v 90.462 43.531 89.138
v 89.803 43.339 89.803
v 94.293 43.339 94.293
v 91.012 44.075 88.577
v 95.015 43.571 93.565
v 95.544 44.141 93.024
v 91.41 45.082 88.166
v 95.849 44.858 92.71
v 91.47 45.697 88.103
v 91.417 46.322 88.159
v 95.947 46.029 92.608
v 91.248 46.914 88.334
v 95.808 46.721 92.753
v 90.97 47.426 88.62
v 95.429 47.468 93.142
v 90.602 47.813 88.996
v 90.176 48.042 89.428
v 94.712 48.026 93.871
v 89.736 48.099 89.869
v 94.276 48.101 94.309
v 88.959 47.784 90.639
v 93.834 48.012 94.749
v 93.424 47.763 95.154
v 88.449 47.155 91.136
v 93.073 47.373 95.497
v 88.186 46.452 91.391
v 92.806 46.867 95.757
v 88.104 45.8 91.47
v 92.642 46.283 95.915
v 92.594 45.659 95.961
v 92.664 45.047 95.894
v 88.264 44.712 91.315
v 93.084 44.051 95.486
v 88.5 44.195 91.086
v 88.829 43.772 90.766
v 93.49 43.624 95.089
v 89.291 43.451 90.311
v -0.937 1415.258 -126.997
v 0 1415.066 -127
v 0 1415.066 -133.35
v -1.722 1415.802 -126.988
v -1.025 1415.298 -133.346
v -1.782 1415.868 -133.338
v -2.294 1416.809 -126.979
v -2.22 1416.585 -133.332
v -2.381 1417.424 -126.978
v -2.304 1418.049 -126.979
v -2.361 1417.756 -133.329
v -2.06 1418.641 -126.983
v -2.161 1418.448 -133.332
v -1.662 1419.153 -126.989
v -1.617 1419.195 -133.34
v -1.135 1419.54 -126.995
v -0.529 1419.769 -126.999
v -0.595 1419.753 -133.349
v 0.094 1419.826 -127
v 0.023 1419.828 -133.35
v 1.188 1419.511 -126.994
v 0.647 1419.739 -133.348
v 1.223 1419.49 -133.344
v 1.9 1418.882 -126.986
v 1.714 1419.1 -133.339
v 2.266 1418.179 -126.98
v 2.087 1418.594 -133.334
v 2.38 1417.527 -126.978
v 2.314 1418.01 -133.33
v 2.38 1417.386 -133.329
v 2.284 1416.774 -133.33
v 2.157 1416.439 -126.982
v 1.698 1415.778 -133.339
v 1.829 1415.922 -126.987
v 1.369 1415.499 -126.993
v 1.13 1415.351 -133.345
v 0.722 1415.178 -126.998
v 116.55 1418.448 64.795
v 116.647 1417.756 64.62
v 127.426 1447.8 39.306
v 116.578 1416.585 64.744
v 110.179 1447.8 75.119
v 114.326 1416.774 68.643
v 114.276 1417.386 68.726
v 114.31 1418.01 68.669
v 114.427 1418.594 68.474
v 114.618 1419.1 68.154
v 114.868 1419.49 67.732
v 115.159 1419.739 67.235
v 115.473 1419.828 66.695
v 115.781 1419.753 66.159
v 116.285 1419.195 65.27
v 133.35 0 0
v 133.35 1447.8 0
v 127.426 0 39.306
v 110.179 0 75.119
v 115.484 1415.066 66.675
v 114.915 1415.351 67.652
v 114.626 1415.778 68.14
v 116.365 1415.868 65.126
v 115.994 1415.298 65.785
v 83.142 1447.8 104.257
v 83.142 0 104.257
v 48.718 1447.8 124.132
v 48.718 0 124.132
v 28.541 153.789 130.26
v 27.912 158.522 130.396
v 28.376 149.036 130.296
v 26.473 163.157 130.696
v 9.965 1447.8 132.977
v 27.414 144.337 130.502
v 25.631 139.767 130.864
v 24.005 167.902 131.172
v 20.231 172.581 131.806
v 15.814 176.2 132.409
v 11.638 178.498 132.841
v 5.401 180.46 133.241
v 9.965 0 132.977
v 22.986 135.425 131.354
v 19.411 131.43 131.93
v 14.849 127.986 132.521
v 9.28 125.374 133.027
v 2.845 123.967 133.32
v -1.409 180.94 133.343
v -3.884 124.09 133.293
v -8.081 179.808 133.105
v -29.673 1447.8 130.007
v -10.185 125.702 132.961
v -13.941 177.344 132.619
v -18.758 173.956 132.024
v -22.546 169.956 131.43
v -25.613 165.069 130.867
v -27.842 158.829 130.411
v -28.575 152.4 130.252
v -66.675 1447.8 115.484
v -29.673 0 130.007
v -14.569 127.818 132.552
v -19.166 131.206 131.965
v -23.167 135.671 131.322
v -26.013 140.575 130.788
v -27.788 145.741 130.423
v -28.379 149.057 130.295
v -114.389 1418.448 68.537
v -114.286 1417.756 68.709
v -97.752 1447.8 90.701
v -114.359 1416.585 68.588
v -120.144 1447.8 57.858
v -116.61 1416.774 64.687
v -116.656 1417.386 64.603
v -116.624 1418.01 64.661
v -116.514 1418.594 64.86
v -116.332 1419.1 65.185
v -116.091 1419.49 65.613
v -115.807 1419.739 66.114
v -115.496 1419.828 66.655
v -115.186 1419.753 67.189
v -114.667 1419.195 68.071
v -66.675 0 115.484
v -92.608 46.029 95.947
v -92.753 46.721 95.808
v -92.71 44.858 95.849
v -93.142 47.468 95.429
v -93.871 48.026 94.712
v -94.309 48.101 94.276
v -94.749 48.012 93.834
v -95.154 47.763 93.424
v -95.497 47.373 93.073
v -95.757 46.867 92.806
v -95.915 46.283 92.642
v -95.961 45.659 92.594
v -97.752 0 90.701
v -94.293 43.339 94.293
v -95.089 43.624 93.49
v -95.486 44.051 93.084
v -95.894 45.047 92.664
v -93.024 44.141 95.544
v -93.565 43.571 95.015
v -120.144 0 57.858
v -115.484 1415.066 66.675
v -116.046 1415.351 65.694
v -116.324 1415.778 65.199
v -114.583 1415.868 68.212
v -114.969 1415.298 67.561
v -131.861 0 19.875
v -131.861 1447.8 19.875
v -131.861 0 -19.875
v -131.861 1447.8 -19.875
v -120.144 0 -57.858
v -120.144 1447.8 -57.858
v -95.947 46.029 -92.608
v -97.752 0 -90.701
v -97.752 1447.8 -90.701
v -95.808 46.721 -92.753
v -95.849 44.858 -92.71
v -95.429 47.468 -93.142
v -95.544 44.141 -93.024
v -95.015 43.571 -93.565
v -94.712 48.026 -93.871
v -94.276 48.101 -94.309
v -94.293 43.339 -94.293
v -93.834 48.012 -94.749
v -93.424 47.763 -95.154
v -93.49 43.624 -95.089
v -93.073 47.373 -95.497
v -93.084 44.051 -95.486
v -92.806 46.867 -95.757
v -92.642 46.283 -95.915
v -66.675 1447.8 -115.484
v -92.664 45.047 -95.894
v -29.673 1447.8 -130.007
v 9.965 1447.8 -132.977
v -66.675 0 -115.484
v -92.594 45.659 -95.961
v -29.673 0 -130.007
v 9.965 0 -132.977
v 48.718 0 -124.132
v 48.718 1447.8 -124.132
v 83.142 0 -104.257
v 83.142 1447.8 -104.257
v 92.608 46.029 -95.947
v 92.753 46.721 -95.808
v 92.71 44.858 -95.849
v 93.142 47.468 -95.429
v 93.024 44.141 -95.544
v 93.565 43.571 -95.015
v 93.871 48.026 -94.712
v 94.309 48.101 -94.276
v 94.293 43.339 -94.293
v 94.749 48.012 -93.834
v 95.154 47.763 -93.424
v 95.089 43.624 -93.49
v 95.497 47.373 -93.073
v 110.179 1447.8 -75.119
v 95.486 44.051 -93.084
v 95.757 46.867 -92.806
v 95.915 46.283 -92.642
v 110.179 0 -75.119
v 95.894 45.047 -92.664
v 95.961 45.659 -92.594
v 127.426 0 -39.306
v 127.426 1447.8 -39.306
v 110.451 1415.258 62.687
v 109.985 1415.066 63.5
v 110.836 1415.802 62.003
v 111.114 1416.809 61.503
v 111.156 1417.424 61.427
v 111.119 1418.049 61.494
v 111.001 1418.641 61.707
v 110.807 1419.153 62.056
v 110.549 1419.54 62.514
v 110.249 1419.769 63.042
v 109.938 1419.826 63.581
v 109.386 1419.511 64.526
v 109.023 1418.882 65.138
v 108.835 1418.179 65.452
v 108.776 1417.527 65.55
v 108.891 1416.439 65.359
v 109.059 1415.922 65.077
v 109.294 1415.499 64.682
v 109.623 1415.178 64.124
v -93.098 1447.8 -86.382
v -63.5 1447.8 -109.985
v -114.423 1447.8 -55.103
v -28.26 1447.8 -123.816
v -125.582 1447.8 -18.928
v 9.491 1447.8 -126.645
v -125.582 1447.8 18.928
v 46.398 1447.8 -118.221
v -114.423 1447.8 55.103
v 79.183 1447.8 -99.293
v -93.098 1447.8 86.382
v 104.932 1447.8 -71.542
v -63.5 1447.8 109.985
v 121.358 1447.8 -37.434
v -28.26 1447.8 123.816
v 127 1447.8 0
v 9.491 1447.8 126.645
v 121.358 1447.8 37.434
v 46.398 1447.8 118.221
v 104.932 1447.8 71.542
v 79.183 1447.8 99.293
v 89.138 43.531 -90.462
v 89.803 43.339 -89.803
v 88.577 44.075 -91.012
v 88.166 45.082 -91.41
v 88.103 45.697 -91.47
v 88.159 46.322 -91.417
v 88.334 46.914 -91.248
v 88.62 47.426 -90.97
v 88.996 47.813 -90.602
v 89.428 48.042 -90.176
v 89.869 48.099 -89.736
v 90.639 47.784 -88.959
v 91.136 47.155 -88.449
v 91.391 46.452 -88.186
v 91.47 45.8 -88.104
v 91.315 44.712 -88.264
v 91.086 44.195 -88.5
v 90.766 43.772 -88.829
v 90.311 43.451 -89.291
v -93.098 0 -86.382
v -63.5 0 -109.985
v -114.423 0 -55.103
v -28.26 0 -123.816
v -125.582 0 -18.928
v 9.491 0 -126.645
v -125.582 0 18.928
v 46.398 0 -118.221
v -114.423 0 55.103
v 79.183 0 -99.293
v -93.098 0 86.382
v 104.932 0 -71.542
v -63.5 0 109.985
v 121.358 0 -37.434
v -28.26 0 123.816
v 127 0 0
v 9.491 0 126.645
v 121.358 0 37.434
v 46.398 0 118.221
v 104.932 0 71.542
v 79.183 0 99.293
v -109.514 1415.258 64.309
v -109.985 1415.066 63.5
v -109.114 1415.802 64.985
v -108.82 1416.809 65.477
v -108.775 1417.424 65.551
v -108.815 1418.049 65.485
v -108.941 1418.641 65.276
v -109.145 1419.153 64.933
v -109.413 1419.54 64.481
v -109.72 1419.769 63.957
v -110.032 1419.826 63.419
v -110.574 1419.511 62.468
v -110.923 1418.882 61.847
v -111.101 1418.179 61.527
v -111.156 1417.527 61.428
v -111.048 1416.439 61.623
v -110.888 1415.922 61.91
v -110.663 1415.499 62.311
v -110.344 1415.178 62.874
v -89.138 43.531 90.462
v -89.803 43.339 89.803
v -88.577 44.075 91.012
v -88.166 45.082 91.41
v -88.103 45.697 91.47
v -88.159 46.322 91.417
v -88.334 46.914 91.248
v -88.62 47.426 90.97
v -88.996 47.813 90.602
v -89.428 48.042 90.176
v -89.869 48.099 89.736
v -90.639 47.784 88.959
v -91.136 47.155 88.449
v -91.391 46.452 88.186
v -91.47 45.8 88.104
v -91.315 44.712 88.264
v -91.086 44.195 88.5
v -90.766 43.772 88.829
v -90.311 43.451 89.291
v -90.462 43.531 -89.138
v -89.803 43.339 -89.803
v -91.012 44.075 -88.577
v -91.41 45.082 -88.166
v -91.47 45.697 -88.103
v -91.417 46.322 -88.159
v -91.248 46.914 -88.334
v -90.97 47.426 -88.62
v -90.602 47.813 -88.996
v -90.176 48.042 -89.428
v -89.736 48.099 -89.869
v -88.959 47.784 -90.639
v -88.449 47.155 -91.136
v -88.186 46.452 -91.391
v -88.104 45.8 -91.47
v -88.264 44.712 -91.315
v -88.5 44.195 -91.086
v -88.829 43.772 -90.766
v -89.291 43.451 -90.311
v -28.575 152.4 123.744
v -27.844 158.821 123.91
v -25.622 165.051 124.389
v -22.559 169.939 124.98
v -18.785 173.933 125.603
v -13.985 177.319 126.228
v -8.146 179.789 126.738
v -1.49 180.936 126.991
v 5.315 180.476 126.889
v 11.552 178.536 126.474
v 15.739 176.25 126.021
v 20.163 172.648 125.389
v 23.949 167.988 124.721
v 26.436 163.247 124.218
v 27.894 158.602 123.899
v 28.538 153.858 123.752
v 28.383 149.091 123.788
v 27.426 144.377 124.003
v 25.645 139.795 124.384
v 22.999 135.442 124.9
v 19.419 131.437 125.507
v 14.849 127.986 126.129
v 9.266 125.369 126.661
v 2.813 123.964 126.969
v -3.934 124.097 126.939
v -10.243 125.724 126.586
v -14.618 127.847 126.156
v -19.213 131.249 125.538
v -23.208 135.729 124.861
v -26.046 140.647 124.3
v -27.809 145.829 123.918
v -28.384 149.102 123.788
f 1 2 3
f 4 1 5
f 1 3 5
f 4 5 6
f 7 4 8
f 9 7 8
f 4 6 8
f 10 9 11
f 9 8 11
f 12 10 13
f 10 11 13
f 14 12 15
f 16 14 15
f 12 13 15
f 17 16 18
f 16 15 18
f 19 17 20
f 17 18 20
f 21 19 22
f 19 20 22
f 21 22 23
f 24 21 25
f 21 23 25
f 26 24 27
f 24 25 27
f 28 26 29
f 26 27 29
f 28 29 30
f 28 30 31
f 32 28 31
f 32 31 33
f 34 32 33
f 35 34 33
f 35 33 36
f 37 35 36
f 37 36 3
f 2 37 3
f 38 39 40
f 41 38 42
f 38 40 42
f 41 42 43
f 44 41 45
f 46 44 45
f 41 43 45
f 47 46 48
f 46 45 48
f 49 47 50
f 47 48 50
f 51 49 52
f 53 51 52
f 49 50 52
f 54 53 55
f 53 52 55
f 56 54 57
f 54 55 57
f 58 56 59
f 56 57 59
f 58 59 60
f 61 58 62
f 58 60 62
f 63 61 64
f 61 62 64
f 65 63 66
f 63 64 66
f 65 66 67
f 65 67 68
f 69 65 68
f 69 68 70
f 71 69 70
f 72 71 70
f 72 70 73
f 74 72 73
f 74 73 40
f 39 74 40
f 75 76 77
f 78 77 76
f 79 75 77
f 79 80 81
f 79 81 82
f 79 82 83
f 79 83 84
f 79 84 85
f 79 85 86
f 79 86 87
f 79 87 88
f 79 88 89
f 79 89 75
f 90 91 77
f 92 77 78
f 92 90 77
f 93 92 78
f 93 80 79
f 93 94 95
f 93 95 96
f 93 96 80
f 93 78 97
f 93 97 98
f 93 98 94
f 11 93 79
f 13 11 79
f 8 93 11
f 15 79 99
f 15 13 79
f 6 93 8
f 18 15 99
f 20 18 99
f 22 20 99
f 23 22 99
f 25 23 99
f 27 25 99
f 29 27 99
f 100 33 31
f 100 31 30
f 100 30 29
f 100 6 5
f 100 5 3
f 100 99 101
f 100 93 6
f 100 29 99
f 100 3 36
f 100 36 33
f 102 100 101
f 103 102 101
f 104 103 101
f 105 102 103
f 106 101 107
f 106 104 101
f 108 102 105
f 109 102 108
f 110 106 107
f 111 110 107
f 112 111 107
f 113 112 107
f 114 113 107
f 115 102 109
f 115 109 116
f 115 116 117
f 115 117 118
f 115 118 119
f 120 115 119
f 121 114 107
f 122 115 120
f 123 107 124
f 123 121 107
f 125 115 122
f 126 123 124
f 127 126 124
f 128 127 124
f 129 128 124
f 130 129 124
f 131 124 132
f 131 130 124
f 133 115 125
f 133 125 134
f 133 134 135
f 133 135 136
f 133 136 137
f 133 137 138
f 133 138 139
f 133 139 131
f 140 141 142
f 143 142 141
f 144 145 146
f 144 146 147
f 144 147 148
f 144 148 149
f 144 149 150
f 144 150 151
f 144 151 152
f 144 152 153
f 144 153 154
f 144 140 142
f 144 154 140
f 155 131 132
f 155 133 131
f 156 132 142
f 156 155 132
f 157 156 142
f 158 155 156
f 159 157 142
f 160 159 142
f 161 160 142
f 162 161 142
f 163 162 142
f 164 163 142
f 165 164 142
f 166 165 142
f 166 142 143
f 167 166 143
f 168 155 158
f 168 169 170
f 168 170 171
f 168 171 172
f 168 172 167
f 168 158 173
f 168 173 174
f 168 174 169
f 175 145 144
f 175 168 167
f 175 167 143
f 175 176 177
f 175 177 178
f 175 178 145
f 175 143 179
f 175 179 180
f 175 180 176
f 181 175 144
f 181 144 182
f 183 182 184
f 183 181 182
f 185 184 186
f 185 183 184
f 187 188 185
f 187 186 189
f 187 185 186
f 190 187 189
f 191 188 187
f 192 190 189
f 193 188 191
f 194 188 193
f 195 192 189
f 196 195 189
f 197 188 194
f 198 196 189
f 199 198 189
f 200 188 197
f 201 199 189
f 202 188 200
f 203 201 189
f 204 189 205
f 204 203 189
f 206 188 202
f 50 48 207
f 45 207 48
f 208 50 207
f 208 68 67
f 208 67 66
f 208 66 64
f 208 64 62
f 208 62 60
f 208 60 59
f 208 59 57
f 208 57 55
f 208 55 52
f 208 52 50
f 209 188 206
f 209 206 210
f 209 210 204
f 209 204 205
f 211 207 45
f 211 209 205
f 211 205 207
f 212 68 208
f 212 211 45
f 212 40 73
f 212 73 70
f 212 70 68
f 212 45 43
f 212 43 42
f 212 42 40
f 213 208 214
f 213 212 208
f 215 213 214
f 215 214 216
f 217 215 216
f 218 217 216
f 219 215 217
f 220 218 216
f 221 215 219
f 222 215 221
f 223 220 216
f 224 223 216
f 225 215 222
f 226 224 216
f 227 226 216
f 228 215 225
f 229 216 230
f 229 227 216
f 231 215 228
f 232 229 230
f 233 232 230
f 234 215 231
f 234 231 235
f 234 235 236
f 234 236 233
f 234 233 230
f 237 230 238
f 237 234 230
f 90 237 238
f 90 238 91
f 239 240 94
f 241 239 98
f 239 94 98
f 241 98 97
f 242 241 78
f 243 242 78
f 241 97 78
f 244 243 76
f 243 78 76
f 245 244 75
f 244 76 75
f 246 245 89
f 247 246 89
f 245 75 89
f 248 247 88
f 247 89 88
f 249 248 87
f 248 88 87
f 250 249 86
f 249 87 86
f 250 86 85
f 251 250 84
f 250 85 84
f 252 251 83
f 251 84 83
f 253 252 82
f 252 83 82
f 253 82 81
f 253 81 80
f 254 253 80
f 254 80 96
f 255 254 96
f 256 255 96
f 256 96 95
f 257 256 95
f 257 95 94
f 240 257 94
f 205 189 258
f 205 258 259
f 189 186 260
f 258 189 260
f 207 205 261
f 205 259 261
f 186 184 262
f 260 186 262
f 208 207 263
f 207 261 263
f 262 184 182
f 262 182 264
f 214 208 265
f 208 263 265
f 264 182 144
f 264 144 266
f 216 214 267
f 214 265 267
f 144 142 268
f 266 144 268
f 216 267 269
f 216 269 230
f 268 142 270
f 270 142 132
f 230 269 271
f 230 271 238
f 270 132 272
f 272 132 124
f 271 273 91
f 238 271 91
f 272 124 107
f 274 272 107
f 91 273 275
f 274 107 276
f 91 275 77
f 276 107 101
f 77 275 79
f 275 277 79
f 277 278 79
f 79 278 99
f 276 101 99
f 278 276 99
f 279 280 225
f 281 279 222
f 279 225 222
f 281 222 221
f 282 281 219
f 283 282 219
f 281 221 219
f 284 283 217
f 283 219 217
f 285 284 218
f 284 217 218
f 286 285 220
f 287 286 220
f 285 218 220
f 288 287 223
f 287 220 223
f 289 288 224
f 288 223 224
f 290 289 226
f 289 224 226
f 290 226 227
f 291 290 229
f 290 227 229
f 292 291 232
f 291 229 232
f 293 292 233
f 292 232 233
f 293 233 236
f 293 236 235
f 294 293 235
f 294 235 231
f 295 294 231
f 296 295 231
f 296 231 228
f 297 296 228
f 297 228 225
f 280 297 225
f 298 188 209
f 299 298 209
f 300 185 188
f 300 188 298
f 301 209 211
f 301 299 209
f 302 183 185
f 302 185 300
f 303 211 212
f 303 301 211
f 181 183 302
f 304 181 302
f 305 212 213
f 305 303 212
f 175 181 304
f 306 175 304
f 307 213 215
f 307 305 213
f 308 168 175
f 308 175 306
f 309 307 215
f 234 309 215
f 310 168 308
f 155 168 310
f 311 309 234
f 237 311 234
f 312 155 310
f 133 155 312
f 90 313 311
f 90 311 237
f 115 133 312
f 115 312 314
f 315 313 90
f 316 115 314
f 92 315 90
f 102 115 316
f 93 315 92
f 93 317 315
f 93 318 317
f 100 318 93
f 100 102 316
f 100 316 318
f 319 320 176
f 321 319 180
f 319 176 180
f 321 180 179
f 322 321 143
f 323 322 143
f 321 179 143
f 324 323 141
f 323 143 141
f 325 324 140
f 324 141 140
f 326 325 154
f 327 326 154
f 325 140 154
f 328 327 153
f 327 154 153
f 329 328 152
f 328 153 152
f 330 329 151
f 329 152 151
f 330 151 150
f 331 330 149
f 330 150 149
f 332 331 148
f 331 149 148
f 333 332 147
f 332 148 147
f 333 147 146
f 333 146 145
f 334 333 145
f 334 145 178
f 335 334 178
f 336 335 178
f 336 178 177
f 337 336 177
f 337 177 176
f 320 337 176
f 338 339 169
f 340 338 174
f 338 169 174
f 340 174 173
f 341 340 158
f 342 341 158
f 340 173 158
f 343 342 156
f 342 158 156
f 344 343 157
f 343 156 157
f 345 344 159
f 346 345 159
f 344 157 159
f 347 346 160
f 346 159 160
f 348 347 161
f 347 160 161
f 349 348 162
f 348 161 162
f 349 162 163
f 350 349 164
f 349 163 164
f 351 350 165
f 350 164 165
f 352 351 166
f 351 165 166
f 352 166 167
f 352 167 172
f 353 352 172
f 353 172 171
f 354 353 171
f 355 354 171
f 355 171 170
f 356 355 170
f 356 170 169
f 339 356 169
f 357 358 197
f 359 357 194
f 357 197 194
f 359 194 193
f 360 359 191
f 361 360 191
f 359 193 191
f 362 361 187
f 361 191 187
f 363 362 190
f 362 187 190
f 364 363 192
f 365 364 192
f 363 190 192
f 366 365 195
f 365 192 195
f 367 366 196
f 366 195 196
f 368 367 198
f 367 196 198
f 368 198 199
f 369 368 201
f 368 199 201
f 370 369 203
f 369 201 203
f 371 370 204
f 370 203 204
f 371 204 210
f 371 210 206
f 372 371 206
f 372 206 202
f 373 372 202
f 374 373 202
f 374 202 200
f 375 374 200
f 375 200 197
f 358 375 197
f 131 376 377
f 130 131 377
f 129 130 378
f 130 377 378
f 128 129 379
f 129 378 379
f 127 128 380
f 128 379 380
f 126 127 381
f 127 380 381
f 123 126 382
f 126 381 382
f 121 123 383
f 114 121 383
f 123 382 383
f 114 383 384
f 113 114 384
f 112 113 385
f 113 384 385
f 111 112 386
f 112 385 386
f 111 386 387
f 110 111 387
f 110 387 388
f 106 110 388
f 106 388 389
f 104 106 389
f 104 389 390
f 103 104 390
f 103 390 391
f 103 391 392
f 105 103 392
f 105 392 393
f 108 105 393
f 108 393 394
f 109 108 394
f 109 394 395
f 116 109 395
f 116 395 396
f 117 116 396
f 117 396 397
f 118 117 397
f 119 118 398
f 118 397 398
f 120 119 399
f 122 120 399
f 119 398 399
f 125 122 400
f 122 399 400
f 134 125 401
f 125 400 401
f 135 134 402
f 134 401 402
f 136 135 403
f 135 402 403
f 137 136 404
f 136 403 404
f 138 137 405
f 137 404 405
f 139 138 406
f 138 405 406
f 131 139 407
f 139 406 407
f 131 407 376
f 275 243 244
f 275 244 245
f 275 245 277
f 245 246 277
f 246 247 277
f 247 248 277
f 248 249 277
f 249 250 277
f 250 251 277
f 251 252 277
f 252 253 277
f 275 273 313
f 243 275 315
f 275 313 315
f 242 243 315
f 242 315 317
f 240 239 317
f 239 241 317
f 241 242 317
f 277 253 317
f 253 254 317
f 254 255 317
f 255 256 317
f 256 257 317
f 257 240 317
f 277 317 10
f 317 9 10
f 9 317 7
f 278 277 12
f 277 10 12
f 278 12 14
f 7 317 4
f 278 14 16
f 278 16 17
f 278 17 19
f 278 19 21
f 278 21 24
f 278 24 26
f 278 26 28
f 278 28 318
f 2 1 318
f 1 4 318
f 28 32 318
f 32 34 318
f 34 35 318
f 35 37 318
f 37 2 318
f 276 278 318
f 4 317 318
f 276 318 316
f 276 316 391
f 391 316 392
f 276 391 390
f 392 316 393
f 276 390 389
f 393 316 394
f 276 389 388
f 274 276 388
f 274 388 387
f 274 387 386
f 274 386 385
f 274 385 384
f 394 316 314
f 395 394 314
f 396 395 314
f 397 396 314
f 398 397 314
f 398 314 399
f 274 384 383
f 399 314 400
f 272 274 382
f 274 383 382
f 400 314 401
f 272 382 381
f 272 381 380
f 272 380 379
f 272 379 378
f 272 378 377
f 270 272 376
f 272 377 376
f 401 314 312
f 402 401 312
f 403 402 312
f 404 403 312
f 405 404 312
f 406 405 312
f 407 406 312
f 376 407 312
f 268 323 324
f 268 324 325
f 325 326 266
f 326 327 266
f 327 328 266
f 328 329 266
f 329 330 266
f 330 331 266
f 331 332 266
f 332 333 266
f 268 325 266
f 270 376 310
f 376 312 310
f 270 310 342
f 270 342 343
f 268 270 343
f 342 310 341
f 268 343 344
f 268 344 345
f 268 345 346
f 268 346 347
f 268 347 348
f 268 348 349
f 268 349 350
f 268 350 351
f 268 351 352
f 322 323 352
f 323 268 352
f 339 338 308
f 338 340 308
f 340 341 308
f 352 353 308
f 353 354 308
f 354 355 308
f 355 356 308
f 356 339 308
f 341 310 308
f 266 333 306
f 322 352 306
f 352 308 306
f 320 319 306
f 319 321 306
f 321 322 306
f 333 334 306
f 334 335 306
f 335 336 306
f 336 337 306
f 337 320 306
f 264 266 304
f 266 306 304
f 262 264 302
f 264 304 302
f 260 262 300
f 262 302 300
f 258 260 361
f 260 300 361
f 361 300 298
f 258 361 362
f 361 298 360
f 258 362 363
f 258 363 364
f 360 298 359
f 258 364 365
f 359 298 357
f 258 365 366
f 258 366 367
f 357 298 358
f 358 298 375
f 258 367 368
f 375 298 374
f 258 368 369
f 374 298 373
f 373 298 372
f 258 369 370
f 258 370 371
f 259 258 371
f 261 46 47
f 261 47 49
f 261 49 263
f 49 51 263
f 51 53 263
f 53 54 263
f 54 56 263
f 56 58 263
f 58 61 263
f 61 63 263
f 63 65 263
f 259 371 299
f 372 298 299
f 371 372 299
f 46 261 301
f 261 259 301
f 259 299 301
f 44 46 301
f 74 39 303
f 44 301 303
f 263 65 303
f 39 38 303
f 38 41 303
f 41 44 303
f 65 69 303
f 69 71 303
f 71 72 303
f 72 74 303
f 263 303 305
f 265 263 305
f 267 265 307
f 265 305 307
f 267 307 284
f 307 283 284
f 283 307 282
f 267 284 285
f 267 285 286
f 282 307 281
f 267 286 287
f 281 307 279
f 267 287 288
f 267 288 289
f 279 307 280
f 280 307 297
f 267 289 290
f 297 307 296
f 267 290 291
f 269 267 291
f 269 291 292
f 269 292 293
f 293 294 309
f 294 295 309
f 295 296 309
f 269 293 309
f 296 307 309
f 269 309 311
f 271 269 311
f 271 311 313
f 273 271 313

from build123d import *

# Parameters (mm, degrees)
F0_R             = 133.35
F0_R_2           = 127
F2_DEPTH         = 1447.8
F5_D             = 57.15
F5_DEPTH         = 12.7
F5_START         = 3.0975841
F5_TIP           = 17.1695921887
F7_R             = 2.38125
F8_DEPTH         = 25.4
F8_COPIES_COUNT  = 4
F10_R            = 2.38125
F11_DEPTH        = 25.4
F11_COPIES_COUNT = 3


# Not quite as in the source:
# - a pattern or mirror of a feature is missing from the dataset's text; its kind, count and spacing are read off the source's solid


with BuildPart() as f2:
    # F0 (on Front) → F2 (new body)
    with BuildSketch(Plane.XZ):
        Circle(F0_R)
        Circle(F0_R_2, mode=Mode.SUBTRACT)
    extrude(amount=-F2_DEPTH)

    # F5
    # its depths count from where the whole tool has entered the part; down to there all is cleared
    with Locations(Plane.XY.offset(133.35).offset(-F5_START)):
        with Locations((0, 152.4)):
            Hole(F5_D / 2, depth=F5_DEPTH)
            with Locations((0, 0, -(F5_DEPTH + F5_TIP / 2))):  # 118° drill point
                Cone(0, F5_D / 2, F5_TIP, mode=Mode.SUBTRACT)

    # F7 (on line) → F8 (cut)
    with BuildSketch(Plane(origin=(-94.2926892712, 0, 94.2926892712), x_dir=(0, -1, 0), z_dir=(-0.7071067812, 0, 0.7071067812))):
        with Locations((-45.72, 0)):
            Circle(F7_R)
    f8 = extrude(amount=-F8_DEPTH, mode=Mode.SUBTRACT)

    # F8_copies: F8 ×4 about axis
    f8_copies_axis = Axis((0, 0, 0), (0, 1, 0))
    for i in range(1, F8_COPIES_COUNT):
        add(f8.rotate(f8_copies_axis, i * 360 / F8_COPIES_COUNT), mode=Mode.SUBTRACT)

    # F10 (on line) → F11 (cut)
    with BuildSketch(Plane(origin=(-115.4844875947, 0, 66.675), x_dir=(0, -1, 0), z_dir=(-0.8660254038, 0, 0.5))):
        with Locations((-1417.447, 0)):
            Circle(F10_R)
    f11 = extrude(amount=-F11_DEPTH, mode=Mode.SUBTRACT)

    # F11_copies: F11 ×3 about axis
    f11_copies_axis = Axis((0, 0, 0), (0, 1, 0))
    for i in range(1, F11_COPIES_COUNT):
        add(f11.rotate(f11_copies_axis, i * 360 / F11_COPIES_COUNT), mode=Mode.SUBTRACT)


solid = f2.part
